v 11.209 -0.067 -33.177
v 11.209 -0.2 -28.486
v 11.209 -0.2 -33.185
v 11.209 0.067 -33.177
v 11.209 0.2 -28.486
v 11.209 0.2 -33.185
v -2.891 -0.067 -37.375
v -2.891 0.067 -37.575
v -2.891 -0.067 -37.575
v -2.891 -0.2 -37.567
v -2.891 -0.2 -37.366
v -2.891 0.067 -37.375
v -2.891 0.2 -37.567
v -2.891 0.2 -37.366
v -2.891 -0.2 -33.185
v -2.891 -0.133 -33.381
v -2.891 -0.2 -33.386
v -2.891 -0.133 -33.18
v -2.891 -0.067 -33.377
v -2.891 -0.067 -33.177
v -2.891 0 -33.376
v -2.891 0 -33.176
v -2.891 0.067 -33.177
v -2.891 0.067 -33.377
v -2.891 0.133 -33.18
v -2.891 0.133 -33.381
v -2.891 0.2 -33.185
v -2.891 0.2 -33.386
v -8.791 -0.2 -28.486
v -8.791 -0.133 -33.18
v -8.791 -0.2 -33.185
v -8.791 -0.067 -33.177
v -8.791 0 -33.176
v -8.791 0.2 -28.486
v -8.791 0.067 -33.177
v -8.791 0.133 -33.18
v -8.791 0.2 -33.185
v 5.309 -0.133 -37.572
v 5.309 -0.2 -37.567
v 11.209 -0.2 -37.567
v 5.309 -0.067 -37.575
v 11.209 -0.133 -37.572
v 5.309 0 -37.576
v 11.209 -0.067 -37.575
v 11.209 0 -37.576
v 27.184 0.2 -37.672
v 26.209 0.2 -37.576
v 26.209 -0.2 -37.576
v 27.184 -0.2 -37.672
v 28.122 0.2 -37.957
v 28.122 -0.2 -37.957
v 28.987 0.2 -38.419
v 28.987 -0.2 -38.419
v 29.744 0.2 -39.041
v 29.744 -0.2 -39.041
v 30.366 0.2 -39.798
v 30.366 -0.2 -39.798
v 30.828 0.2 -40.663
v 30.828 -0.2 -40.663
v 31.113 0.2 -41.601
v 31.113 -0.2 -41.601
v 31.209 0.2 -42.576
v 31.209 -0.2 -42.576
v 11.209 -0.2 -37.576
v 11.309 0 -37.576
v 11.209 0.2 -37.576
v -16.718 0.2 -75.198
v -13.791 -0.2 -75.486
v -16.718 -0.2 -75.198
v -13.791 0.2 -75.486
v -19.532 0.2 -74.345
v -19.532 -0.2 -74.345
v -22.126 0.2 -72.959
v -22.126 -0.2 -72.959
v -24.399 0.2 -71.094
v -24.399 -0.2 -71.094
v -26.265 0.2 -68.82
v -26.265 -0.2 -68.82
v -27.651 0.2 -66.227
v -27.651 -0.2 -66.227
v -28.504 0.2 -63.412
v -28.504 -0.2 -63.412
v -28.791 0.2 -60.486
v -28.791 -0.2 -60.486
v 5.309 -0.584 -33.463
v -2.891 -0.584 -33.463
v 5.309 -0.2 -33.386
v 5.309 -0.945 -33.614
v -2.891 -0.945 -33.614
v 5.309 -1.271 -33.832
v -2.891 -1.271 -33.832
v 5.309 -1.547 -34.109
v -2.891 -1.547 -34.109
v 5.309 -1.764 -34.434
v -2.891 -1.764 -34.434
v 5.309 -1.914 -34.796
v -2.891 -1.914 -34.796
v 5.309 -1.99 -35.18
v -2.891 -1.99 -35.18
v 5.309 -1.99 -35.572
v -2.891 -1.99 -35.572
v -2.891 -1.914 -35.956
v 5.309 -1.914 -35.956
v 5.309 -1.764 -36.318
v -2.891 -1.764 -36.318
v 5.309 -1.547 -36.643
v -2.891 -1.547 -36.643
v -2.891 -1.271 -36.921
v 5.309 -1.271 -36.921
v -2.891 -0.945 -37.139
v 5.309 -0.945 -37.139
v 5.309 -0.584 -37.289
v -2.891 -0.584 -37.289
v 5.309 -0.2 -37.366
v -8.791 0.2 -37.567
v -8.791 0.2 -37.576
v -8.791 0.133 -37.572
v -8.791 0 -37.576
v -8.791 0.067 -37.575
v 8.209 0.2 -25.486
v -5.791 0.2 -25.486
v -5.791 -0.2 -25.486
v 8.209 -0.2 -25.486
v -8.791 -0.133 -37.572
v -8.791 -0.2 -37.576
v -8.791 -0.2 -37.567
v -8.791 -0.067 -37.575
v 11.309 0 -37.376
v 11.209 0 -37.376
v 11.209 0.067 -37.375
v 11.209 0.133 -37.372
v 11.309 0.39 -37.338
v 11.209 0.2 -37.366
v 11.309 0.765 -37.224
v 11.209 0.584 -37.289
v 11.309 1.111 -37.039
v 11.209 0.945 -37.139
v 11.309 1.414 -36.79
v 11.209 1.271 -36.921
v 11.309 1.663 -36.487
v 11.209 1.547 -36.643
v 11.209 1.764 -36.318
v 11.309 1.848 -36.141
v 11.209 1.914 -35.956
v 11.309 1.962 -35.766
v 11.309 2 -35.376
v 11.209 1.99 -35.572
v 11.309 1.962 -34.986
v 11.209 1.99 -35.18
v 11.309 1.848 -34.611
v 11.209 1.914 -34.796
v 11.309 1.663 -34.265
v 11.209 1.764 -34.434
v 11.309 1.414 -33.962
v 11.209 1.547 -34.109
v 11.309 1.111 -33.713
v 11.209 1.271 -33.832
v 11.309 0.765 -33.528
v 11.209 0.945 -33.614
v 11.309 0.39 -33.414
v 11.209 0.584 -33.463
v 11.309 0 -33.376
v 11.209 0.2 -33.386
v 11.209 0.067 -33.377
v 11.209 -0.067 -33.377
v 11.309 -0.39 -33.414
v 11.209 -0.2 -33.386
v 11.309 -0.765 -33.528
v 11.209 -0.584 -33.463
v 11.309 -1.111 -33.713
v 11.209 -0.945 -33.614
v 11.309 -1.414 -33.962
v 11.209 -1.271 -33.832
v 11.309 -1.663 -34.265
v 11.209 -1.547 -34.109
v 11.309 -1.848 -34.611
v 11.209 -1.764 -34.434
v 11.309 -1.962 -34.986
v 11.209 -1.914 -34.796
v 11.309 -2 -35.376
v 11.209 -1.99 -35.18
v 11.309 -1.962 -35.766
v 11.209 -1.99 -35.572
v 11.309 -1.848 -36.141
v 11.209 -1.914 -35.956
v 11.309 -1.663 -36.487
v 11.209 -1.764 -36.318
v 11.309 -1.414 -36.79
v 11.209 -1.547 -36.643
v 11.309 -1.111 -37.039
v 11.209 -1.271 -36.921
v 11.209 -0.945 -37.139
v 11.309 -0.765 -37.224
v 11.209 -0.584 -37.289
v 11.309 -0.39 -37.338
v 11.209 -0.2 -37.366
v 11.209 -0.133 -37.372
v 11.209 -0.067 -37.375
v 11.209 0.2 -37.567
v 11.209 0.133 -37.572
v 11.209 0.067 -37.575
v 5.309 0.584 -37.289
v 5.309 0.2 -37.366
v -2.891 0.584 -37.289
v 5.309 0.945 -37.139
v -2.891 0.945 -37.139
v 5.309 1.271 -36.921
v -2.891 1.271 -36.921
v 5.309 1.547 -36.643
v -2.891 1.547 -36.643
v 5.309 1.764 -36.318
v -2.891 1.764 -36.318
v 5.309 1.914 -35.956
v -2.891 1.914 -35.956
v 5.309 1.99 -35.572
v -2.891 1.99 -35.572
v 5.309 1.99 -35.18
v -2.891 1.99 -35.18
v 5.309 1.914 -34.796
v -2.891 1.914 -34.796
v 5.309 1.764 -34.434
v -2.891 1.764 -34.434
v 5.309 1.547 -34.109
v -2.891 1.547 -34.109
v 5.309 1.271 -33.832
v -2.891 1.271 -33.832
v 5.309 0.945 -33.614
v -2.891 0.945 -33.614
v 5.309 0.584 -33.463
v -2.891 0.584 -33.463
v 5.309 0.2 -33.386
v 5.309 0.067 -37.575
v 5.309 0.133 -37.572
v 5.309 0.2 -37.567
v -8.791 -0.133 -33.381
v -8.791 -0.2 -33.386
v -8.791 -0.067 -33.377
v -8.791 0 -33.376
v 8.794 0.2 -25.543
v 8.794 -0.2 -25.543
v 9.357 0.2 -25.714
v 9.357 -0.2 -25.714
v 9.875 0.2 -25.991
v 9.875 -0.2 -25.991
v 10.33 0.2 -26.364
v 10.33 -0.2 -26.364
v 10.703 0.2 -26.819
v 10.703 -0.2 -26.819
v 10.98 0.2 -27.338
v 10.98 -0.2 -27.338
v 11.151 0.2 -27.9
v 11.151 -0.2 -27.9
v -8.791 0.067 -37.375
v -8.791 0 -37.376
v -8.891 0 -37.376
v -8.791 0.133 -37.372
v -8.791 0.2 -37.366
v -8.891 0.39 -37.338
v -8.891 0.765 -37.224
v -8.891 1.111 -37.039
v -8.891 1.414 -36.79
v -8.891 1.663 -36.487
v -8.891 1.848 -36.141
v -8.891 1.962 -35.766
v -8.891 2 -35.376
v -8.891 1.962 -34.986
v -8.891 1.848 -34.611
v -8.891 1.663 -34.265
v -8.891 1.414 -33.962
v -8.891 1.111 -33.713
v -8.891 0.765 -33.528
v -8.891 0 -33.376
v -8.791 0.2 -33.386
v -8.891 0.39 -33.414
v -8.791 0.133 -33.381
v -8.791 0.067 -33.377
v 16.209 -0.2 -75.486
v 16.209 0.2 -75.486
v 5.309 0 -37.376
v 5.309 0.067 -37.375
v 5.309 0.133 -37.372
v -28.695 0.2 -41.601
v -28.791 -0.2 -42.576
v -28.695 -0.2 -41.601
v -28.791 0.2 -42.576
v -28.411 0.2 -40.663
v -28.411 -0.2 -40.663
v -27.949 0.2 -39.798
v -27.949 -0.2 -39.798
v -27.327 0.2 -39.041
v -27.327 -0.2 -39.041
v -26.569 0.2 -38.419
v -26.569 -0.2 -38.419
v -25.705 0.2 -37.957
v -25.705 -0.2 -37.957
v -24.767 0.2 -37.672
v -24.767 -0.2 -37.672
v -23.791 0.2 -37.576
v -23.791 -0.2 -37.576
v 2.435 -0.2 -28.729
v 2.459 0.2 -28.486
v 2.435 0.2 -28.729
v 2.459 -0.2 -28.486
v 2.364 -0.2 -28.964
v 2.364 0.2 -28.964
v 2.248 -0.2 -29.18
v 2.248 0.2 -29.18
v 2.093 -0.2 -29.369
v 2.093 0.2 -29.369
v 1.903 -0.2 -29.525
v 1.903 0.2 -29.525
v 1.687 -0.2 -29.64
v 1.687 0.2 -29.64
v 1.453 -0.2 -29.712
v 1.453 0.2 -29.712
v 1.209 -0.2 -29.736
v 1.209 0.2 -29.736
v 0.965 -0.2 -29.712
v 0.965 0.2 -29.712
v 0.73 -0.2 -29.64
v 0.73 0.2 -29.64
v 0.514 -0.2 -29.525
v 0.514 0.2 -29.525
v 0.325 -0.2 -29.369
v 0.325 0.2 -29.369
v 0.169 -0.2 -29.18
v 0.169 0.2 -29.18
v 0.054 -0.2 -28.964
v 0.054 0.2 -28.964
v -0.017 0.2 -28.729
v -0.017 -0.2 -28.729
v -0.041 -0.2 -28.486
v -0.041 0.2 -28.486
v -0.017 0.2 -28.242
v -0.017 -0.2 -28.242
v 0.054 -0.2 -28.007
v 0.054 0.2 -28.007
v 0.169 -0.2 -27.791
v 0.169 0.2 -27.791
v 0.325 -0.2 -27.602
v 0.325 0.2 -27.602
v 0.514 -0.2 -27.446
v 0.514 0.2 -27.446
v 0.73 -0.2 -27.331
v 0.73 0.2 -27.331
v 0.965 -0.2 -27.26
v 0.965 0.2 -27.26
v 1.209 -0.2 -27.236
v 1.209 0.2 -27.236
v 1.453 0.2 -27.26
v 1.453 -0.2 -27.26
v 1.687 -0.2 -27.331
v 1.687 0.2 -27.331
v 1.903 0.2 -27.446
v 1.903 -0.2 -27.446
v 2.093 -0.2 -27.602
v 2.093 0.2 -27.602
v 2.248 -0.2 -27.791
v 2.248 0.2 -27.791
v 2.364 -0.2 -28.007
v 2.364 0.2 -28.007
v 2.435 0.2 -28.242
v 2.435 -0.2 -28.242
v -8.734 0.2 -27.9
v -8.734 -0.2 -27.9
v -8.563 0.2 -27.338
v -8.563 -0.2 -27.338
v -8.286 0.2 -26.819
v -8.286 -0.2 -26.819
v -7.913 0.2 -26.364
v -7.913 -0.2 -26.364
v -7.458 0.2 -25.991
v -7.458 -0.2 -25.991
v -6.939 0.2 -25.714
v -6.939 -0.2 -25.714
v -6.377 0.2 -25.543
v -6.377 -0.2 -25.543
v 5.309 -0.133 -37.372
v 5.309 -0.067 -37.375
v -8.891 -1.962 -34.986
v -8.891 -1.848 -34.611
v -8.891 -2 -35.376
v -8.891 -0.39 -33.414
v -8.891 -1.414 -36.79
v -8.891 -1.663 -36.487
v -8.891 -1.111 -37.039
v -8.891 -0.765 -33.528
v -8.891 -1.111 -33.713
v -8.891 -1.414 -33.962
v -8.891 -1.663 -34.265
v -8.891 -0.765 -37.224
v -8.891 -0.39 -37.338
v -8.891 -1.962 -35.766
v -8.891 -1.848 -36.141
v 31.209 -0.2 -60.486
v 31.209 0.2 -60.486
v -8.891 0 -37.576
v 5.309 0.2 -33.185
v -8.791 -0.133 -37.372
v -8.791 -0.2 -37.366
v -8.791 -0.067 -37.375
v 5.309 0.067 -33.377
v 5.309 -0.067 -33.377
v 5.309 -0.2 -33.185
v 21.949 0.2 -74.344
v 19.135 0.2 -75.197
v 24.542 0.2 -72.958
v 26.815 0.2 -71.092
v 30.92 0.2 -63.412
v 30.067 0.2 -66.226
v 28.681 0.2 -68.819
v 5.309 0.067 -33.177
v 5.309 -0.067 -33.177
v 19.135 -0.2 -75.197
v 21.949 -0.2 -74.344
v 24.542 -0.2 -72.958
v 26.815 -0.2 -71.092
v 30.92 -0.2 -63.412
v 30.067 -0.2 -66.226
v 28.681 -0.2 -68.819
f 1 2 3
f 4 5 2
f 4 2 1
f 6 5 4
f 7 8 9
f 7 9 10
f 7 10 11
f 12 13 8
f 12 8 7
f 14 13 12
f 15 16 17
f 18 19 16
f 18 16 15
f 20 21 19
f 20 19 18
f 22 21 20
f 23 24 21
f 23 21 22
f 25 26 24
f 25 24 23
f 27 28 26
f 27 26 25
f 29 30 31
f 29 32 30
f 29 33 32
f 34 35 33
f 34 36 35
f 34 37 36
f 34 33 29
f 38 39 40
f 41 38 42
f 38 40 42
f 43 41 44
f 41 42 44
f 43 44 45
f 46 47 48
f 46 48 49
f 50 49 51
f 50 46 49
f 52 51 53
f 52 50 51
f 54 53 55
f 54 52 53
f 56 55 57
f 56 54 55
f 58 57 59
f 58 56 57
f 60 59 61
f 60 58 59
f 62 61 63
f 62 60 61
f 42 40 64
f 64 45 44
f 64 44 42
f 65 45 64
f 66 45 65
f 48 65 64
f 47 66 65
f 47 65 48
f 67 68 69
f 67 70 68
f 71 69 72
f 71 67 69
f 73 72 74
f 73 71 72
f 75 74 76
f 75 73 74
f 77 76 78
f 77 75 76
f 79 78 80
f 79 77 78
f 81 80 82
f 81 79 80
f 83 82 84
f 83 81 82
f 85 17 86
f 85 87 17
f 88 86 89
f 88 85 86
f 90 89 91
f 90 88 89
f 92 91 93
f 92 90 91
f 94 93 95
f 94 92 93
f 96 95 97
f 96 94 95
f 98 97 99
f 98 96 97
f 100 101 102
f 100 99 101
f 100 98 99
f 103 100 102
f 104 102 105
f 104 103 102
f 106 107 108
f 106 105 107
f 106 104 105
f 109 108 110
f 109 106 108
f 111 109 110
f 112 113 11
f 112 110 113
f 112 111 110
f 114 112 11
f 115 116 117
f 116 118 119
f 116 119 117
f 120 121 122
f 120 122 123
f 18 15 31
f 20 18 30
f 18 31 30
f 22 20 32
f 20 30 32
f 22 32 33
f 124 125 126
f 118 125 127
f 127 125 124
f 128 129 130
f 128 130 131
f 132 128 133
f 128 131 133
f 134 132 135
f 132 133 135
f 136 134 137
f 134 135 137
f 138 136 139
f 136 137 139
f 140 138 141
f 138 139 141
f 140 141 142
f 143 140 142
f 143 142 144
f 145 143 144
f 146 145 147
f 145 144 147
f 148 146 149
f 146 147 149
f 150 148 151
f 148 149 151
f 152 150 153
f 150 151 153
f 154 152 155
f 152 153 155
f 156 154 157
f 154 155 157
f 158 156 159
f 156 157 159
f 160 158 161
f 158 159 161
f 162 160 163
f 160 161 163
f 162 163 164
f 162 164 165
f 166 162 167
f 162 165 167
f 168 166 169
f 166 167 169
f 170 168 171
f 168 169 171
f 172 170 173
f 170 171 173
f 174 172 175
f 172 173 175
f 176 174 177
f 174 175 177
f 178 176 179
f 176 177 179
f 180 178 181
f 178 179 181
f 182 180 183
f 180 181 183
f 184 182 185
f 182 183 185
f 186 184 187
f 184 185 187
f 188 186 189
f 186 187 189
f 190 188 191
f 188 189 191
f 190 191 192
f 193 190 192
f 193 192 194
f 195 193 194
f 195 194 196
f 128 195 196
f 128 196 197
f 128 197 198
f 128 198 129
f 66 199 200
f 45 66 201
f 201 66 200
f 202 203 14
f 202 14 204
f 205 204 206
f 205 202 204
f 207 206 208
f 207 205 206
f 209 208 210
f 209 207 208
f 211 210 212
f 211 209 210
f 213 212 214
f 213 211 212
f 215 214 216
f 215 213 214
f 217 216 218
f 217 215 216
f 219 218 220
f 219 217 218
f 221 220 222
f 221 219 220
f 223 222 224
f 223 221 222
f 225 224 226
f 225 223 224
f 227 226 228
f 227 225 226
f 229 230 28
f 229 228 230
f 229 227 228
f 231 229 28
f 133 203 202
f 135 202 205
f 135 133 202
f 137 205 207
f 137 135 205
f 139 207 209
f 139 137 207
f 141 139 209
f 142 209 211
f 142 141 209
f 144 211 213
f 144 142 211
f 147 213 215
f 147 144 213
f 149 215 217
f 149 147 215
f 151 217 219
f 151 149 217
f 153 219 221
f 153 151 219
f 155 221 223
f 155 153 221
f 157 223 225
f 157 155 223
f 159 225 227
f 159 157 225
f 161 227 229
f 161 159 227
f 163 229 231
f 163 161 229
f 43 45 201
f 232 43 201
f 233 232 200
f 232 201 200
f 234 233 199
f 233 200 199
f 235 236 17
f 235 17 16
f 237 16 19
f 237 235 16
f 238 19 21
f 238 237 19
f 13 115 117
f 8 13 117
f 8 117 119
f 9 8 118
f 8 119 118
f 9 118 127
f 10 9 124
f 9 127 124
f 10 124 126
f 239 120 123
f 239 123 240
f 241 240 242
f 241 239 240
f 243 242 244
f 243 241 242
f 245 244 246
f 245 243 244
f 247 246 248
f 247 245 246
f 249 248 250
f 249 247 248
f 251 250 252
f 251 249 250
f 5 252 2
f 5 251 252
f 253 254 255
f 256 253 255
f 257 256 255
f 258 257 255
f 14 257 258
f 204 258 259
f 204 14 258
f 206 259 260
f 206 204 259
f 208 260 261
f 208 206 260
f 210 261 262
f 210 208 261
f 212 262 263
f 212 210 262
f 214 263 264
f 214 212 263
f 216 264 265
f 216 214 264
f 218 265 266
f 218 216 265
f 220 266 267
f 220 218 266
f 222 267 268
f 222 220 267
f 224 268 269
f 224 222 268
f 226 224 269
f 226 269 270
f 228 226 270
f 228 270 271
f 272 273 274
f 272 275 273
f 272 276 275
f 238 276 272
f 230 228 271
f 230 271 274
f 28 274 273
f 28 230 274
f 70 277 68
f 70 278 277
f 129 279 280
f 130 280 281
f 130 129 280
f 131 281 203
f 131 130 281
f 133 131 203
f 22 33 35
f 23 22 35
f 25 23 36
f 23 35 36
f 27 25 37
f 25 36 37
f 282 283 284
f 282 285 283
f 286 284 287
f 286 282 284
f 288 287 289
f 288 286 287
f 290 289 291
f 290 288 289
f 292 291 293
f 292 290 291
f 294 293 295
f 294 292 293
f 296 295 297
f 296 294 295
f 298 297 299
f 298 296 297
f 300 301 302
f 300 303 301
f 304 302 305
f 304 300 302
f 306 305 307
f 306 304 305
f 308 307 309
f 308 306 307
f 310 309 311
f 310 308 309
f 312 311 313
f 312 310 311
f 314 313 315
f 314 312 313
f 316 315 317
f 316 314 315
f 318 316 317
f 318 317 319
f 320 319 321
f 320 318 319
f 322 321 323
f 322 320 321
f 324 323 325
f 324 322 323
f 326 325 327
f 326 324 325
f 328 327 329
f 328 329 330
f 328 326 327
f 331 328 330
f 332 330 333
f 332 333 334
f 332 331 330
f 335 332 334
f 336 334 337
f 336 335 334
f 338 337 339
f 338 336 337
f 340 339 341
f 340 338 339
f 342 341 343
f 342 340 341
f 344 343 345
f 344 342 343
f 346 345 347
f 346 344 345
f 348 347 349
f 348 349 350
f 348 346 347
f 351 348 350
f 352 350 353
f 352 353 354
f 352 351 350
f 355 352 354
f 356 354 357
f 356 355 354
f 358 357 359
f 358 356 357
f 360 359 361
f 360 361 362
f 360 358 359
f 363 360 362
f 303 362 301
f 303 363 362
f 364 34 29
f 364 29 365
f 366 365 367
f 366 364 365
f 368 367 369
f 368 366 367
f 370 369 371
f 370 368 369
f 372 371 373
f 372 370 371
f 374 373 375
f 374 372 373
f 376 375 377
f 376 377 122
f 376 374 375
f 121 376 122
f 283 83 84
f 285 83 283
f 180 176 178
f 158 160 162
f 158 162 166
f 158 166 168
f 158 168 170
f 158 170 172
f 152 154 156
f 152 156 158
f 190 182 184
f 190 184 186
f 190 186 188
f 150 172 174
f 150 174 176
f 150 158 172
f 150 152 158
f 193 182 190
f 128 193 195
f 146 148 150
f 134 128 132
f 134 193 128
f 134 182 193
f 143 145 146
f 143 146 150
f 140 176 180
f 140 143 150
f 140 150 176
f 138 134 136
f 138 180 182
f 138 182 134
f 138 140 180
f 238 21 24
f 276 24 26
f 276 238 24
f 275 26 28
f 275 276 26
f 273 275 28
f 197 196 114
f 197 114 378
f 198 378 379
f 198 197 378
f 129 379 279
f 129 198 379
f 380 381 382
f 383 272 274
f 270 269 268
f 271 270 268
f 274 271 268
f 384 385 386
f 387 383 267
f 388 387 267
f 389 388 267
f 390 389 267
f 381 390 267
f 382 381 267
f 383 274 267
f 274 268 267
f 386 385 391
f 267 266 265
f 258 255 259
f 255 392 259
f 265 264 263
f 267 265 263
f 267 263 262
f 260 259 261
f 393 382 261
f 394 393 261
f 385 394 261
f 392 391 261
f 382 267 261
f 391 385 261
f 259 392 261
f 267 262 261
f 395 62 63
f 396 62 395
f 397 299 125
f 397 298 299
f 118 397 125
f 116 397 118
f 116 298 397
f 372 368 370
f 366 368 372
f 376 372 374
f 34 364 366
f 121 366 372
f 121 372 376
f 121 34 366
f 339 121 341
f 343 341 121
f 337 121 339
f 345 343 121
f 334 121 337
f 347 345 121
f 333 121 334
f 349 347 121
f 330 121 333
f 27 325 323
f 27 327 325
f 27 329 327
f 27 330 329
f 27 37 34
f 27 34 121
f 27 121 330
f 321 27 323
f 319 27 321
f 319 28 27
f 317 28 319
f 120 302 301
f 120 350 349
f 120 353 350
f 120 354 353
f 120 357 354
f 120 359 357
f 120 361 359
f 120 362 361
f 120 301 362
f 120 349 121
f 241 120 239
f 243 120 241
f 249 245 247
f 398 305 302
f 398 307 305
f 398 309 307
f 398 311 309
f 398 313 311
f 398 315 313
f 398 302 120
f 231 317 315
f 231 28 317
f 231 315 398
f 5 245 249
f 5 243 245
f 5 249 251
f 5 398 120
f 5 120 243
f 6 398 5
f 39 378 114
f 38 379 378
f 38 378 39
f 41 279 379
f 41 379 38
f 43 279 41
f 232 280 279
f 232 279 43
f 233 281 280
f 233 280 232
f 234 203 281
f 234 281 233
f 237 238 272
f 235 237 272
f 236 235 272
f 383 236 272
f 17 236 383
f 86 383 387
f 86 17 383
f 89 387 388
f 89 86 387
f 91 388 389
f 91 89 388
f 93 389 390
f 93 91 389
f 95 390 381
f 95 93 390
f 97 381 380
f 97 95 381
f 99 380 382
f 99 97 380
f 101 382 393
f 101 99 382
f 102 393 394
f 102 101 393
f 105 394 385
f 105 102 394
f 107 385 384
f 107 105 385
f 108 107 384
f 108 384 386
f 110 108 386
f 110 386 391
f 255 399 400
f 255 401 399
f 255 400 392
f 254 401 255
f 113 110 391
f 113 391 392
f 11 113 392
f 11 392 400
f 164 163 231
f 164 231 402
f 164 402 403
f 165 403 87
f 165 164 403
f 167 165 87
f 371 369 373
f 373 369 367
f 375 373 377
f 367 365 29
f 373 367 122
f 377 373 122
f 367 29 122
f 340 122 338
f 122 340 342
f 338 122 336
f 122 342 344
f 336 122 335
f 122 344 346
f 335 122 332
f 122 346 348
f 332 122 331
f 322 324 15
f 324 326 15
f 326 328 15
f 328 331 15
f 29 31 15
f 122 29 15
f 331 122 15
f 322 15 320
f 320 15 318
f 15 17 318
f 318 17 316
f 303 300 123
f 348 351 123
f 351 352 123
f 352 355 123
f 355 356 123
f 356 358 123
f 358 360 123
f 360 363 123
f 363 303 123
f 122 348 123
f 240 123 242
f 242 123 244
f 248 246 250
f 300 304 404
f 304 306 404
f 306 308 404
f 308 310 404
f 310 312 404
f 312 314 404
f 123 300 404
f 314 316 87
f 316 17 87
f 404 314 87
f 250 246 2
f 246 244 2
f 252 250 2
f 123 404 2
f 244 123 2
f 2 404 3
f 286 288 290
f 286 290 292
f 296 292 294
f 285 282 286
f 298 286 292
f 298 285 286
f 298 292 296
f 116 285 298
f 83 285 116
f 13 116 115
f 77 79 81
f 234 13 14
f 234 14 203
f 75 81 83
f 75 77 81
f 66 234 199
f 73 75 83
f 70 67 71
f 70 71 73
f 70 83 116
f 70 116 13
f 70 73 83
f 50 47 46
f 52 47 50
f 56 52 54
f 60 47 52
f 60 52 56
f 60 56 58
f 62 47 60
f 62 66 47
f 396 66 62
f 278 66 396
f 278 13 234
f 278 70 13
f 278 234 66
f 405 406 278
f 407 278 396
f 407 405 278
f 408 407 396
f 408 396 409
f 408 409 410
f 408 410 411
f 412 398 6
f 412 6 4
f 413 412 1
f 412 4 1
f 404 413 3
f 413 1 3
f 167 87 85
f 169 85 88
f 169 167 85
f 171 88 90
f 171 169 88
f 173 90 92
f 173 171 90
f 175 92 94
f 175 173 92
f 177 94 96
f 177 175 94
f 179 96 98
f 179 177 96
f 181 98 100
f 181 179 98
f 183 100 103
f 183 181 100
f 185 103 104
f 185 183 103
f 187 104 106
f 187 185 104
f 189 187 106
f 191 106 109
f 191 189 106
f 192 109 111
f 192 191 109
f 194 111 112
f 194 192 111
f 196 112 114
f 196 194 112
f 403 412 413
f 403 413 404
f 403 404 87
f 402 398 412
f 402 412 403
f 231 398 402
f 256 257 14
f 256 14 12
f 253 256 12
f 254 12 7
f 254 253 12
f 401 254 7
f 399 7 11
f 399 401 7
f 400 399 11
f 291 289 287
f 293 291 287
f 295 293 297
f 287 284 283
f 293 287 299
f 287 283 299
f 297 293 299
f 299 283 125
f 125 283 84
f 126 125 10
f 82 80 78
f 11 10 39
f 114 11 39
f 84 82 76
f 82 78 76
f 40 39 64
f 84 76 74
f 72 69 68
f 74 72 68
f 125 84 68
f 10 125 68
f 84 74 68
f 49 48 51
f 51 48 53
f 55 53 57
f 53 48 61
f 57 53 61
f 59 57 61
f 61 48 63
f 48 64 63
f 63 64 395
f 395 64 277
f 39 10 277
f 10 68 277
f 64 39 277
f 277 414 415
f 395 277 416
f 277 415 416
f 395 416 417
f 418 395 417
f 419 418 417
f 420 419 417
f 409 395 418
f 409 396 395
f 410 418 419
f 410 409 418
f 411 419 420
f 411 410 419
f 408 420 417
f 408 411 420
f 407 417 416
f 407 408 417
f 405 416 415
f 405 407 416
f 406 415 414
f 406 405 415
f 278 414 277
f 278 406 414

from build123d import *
from build123d.topology import SkipClean

# Parameters (mm, degrees)
EXTRUDE_1_DEPTH      = 0.2
EXTRUDE_1_DEPTH_BACK = 0.2
SKETCH_2_R           = 1.25
EXTRUDE_3_DEPTH      = 0.1
EXTRUDE_3_DEPTH_BACK = 20.1
SKETCH_4_R           = 2
SKETCH_6_R           = 2.2
SKETCH_6_R_2         = 2
CUT_EXTRUDE_2_DEPTH  = 6
CUT_EXTRUDE_START    = -6
SKETCH_7_R           = 2.2
SKETCH_7_R_2         = 2
CUT_EXTRUDE_3_DEPTH  = 6


with BuildPart() as part:
    # 草图2 → 凸台-拉伸1 (new, two sides: drawn at the far end of the back side and taken through both)
    with BuildSketch(Plane(origin=(0, 0, 0), x_dir=(1, 0, 0), z_dir=(0, 1, 0)).offset(-EXTRUDE_1_DEPTH_BACK)):
        with BuildLine():
            Line((-23.791283512, 37.576059538), (-8.791283512, 37.576059538))
            Line((-8.791283512, 37.576059538), (-8.791283512, 28.485605042))
            ThreePointArc((-8.791283512, 28.485605042), (-7.912603856, 26.364284699), (-5.791283512, 25.485605042))
            Line((-5.791283512, 25.485605042), (8.208716488, 25.485605042))
            ThreePointArc((8.208716488, 25.485605042), (10.330036831, 26.364284699), (11.208716488, 28.485605042))
            Line((11.208716488, 28.485605042), (11.208716488, 37.576059538))
            Line((11.208716488, 37.576059538), (26.208716488, 37.576059538))
            ThreePointArc((26.208716488, 37.576059538), (29.744250394, 39.040525632), (31.208716488, 42.576059538))
            Line((31.208716488, 42.576059538), (31.208716488, 60.485605042))
            ThreePointArc((31.208716488, 60.485605042), (26.815318205, 71.09220676), (16.208716488, 75.485605042))
            Line((16.208716488, 75.485605042), (-13.791283512, 75.485605042))
            ThreePointArc((-13.791283512, 75.485605042), (-24.399223726, 71.093545256), (-28.791283512, 60.485605042))
            Line((-28.791283512, 60.485605042), (-28.791283512, 42.576059538))
            ThreePointArc((-28.791283512, 42.576059538), (-27.326817418, 39.040525632), (-23.791283512, 37.576059538))
        make_face()
        with Locations((1.208716488, 28.485605042)):
            Circle(SKETCH_2_R, mode=Mode.SUBTRACT)
    extrude(amount=EXTRUDE_1_DEPTH + EXTRUDE_1_DEPTH_BACK)

    # 草图4 → 凸台-拉伸3 (add, two sides: drawn at the far end of the back side and taken through both)
    with BuildSketch(Plane(origin=(11.208716488, 0, 0), x_dir=(0, 0, -1), z_dir=(1, 0, 0)).offset(-EXTRUDE_3_DEPTH_BACK)):
        with Locations((35.376059538, 0)):
            Circle(SKETCH_4_R)
    extrude(amount=EXTRUDE_3_DEPTH + EXTRUDE_3_DEPTH_BACK)

    # 草图6 → 切除-拉伸2 (cut)
    with SkipClean():  # the faces are left unmerged after this step: merging them gives an invalid solid
        with BuildSketch(Plane.ZY.offset(8.891283512)):
            with Locations((-35.376059538, 0)):
                Circle(SKETCH_6_R)
            with Locations((-35.376059538, 0)):
                Circle(SKETCH_6_R_2, mode=Mode.SUBTRACT)
        extrude(amount=-CUT_EXTRUDE_2_DEPTH, mode=Mode.SUBTRACT)
    add(part.part.scale(1), mode=Mode.REPLACE)  # the faces are merged on a copy

    # 草图7 → 切除-拉伸3 (cut)
    with BuildSketch(Plane(origin=(11.308716488, 0, 0), x_dir=(0, 0, -1), z_dir=(1, 0, 0)).offset(CUT_EXTRUDE_START)):
        with Locations((35.376059538, 0)):
            Circle(SKETCH_7_R)
        with Locations((35.376059538, 0)):
            Circle(SKETCH_7_R_2, mode=Mode.SUBTRACT)
    extrude(amount=CUT_EXTRUDE_3_DEPTH, mode=Mode.SUBTRACT)


solid = part.part
